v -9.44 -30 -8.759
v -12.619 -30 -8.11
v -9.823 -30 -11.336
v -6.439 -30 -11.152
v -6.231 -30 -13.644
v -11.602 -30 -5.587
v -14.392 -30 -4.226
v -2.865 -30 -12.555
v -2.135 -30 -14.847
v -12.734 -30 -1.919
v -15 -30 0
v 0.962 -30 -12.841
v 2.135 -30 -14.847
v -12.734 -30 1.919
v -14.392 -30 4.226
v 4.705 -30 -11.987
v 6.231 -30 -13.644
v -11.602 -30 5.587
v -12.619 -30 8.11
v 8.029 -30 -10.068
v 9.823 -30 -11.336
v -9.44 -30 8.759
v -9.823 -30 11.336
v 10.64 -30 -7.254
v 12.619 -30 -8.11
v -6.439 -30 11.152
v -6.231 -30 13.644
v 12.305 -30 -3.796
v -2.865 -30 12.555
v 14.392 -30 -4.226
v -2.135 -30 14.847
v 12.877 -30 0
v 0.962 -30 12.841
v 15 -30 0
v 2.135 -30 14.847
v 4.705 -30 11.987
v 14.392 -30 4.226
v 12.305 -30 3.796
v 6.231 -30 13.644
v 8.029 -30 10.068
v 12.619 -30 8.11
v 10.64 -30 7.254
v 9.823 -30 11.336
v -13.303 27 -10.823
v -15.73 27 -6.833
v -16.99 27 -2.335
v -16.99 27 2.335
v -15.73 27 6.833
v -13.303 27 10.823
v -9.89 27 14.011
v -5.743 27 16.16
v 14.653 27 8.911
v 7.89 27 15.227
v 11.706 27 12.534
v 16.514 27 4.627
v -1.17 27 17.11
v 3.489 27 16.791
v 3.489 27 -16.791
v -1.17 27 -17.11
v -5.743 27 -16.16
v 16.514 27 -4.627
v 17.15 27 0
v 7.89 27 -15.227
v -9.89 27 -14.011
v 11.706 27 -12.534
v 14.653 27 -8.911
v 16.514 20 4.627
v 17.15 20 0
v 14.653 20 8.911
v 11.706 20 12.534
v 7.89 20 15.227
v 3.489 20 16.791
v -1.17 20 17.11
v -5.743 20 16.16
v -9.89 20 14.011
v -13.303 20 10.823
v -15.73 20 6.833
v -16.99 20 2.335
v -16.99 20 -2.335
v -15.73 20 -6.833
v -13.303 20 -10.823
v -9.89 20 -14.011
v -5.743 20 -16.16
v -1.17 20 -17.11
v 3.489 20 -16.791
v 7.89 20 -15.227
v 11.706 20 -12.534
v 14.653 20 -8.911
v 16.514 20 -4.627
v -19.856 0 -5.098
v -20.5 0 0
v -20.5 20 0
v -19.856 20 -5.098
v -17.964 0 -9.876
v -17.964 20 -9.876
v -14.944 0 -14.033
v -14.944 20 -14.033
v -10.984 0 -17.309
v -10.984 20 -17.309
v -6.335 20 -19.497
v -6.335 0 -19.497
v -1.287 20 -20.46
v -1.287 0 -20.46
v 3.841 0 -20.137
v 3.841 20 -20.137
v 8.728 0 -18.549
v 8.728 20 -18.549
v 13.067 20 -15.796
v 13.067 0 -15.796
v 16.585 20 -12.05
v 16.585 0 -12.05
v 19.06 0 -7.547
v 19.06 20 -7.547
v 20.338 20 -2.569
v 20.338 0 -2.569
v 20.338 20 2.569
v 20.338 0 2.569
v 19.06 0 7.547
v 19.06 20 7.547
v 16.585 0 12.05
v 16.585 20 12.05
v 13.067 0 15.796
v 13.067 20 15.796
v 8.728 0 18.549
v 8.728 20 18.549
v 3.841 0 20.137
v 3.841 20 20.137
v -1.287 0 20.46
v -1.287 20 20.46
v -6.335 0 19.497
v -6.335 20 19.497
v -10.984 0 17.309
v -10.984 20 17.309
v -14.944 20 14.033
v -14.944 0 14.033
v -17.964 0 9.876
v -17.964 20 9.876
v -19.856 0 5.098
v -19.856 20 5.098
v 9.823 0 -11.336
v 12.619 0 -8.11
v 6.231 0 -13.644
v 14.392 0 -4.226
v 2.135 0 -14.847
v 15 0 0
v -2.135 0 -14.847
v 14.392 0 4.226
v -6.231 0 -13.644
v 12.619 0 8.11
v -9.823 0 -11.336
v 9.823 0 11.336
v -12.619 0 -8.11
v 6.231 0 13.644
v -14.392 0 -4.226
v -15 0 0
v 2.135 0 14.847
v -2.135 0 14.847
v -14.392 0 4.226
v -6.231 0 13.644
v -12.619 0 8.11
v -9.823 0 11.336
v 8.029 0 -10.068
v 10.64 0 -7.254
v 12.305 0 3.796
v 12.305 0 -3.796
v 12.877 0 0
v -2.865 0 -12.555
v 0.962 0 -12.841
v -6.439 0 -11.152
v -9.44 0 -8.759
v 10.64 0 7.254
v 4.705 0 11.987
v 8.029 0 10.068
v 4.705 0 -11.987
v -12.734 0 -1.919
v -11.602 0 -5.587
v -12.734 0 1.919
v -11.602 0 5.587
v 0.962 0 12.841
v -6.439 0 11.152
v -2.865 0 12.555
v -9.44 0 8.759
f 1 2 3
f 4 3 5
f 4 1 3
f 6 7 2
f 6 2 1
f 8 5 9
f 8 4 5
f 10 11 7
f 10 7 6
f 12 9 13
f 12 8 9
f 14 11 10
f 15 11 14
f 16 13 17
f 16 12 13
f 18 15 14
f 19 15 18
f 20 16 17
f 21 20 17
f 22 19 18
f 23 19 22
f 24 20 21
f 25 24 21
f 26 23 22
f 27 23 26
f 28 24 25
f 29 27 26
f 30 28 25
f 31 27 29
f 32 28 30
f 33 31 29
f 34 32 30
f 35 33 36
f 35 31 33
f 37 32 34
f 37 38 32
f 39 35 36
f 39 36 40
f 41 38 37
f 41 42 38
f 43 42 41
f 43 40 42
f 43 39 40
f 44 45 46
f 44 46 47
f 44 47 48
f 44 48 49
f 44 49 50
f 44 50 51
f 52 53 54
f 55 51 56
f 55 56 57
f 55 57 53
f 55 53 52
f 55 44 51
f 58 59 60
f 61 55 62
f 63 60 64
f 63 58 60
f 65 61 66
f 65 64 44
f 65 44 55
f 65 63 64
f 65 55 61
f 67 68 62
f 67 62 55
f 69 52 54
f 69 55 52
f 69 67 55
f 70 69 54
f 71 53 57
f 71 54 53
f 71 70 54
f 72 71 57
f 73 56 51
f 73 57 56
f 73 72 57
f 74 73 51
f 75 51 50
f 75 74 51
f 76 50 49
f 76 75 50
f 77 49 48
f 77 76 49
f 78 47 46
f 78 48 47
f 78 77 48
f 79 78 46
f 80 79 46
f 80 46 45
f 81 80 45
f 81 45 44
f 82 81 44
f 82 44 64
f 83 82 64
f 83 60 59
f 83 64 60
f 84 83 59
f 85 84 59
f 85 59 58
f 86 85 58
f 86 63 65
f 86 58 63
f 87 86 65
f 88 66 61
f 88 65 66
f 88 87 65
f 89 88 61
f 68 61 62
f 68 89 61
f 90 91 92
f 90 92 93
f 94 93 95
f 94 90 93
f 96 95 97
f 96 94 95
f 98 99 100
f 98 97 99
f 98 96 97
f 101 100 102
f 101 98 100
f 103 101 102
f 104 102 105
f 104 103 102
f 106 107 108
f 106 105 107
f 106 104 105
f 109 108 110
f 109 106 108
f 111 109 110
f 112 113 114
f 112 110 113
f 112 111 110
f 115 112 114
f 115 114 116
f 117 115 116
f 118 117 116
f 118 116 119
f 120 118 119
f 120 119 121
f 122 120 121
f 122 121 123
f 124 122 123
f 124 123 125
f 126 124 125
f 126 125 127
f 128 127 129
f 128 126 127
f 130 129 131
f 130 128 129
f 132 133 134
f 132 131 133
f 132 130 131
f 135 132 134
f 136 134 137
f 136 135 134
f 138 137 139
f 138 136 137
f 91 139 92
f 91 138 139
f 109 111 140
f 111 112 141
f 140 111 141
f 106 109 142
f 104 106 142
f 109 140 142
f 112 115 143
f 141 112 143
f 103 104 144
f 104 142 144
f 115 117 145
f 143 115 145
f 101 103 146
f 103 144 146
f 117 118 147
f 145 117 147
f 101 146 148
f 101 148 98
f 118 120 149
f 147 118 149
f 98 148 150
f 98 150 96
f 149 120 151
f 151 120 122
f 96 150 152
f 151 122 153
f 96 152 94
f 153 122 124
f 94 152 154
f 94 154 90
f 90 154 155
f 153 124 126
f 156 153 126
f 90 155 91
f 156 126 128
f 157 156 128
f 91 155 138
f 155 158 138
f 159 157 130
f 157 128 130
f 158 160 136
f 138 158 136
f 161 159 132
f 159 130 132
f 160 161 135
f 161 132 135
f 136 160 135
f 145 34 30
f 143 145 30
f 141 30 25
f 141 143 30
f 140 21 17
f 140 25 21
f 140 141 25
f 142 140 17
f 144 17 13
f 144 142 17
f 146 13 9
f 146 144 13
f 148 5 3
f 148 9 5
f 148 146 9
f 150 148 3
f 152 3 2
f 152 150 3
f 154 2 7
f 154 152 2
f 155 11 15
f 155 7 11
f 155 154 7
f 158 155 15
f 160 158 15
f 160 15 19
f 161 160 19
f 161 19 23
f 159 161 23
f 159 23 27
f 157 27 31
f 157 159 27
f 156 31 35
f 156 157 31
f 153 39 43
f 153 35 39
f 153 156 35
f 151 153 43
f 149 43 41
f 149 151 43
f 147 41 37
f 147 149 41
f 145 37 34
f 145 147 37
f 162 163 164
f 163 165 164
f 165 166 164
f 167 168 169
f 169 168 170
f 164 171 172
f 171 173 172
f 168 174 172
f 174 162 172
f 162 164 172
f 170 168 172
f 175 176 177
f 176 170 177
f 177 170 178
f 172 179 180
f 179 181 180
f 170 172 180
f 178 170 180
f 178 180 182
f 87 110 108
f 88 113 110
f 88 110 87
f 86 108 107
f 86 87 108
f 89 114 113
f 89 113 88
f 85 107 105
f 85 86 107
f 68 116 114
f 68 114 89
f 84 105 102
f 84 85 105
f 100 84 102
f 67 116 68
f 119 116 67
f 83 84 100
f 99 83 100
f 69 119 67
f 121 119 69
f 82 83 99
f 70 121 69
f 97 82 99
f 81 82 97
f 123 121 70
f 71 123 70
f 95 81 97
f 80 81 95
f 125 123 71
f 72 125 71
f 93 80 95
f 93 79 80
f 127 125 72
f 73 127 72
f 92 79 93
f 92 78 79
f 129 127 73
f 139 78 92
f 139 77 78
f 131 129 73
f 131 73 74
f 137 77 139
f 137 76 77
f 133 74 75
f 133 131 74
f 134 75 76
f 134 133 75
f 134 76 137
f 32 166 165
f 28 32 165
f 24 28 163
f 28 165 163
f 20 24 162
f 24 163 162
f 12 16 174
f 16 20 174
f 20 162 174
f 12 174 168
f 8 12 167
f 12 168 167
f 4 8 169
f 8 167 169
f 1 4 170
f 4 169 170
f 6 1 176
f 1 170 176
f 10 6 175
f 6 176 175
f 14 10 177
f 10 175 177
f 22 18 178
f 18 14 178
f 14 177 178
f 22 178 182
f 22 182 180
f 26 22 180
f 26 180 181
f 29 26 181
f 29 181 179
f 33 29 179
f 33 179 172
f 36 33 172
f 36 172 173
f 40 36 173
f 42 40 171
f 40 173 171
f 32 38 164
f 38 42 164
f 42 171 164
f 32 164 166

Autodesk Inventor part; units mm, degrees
ref_plane "YZ Plane" through (0, 0, 0) normal (1, 0, 0) x (0, 1, 0)
ref_plane "XZ Plane" through (0, 0, 0) normal (0, 1, 0) x (-1, 0, 0)
ref_plane "XY Plane" through (0, 0, 0) normal (0, 0, 1) x (1, 0, 0)
sketch "Sketch1" plane through (0, 0, 0) normal (0, 1, 0) x (-1, 0, 0)
  circle A0 centre (0, 0) radius 20.5
  dimension "d0" = 41
extrude "Extrusion1" add sketch "Sketch1" along normal blind 20
sketch "Sketch2" plane through (0, 20, 0) normal (0, 1, 0) x (1, 0, 0)
  circle A0 centre (0, 0) radius 20.5 projected
  circle A1 centre (0, 0) radius 17.15
  dimension "d3" = 34.3
extrude "Extrusion2" add sketch "Sketch2" along normal blind 7 contours A1
sketch "Sketch3" plane through (0, 0, 0) normal (0, -1, 0) x (1, 0, 0)
  circle A0 centre (0, 0) radius 15
  circle A1 centre (0, 0) radius 12.8774
  dimension "d6" = 30
extrude "Extrusion3" add sketch "Sketch3" along normal blind 30
properties part number "100"
